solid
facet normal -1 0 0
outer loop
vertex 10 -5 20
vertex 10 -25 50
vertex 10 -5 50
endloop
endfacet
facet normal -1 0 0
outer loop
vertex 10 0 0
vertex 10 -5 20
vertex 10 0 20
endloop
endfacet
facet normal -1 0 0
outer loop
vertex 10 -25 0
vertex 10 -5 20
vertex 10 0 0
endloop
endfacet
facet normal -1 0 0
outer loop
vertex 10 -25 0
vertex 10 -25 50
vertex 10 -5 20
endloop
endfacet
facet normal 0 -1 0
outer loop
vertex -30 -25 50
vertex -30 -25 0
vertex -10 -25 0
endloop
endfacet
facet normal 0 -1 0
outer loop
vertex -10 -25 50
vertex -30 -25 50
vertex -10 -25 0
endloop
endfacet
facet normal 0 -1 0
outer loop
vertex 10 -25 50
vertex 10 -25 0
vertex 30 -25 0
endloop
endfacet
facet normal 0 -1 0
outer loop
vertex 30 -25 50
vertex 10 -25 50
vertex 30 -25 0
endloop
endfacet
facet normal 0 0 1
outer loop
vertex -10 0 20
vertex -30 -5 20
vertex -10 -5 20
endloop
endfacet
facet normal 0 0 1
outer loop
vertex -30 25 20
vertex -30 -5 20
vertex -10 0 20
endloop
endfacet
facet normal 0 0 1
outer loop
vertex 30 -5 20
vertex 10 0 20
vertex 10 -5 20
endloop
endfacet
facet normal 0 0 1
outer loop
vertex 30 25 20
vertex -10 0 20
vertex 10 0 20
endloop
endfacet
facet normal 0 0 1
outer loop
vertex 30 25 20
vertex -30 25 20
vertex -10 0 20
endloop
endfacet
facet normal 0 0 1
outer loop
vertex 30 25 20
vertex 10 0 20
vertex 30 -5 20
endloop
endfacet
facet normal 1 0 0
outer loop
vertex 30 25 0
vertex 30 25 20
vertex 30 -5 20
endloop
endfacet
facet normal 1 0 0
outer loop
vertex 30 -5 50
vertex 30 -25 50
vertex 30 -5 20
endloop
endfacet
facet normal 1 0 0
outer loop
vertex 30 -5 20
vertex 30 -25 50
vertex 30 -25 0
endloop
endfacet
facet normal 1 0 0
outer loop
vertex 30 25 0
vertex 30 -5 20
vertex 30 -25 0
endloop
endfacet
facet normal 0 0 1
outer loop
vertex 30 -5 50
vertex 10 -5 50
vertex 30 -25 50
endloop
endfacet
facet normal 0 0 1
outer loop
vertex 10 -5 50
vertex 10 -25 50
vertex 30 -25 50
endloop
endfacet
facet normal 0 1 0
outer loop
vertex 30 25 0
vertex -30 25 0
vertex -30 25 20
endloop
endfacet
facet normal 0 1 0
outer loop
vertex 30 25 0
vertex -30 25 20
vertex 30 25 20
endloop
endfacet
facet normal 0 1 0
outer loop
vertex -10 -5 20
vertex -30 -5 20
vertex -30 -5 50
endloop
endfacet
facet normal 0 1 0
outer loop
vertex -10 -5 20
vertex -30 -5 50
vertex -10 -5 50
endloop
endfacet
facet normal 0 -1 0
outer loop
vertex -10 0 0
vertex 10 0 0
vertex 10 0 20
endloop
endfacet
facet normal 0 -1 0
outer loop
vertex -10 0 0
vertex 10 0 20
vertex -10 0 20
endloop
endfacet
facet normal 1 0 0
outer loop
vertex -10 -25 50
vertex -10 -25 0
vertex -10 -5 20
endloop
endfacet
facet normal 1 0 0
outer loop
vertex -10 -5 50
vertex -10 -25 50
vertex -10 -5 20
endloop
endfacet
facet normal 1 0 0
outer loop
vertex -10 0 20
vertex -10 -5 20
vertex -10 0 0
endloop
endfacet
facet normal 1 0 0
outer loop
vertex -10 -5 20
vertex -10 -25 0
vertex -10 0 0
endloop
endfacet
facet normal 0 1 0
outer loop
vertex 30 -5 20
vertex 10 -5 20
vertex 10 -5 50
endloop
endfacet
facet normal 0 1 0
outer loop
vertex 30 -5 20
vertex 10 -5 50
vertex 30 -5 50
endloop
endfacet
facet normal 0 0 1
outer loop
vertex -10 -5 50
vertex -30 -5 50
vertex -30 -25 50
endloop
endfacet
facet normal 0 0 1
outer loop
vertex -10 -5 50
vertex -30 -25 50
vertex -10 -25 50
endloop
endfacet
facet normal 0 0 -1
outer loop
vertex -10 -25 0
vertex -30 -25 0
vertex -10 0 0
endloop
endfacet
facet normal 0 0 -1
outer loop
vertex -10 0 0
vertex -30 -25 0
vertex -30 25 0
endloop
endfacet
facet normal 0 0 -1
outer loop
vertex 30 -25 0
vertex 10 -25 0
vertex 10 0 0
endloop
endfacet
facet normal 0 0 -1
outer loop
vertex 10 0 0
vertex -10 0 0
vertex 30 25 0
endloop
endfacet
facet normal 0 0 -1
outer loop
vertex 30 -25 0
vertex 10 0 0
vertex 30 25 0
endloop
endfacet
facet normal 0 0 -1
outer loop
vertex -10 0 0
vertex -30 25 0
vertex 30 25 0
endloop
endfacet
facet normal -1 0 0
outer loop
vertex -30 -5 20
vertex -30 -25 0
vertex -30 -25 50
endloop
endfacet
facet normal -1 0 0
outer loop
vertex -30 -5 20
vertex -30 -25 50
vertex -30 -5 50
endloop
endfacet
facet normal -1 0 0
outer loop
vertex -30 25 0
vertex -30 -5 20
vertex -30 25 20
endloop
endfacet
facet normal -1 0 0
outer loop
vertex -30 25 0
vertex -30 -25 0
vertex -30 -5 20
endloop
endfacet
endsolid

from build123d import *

# Parameters (mm, degrees)
CROQUIS2_W              = 60
CROQUIS2_H              = 50
SALIENTE_EXTRUIR1_DEPTH = 50
CROQUIS3_W              = 60
CROQUIS3_H              = 30
CORTAR_EXTRUIR1_DEPTH   = 35
CROQUIS4_W              = 20
CROQUIS4_H              = 25
CORTAR_EXTRUIR2_DEPTH   = 50
CROQUIS5_W              = 20
CROQUIS5_H              = 30
SALIENTE_EXTRUIR2_DEPTH = 5


with BuildPart() as part:
    # Croquis2 → Saliente-Extruir1 (new body)
    with BuildSketch(Plane.XY):
        Rectangle(CROQUIS2_W, CROQUIS2_H)
    extrude(amount=SALIENTE_EXTRUIR1_DEPTH)

    # Croquis3 → Cortar-Extruir1 (cut)
    with BuildSketch(Plane(origin=(0, 25, 0), x_dir=(1, 0, 0), z_dir=(0, 1, 0))):
        with Locations((0, -35)):
            Rectangle(CROQUIS3_W, CROQUIS3_H)
    extrude(amount=-CORTAR_EXTRUIR1_DEPTH, mode=Mode.SUBTRACT)

    # Croquis4 → Cortar-Extruir2 (cut)
    with BuildSketch(Plane(origin=(0, 0, 0), x_dir=(-1, 0, 0), z_dir=(0, 0, -1))):
        with Locations((0, -12.5)):
            Rectangle(CROQUIS4_W, CROQUIS4_H)
    extrude(amount=-CORTAR_EXTRUIR2_DEPTH, mode=Mode.SUBTRACT)

    # Croquis5 → Saliente-Extruir2 (add)
    with BuildSketch(Plane(origin=(0, -10, 0), x_dir=(1, 0, 0), z_dir=(0, 1, 0))):
        with Locations((20, -35)):
            Rectangle(CROQUIS5_W, CROQUIS5_H)
        with Locations((-20, -35)):
            Rectangle(CROQUIS5_W, CROQUIS5_H)
    extrude(amount=SALIENTE_EXTRUIR2_DEPTH)


solid = part.part
